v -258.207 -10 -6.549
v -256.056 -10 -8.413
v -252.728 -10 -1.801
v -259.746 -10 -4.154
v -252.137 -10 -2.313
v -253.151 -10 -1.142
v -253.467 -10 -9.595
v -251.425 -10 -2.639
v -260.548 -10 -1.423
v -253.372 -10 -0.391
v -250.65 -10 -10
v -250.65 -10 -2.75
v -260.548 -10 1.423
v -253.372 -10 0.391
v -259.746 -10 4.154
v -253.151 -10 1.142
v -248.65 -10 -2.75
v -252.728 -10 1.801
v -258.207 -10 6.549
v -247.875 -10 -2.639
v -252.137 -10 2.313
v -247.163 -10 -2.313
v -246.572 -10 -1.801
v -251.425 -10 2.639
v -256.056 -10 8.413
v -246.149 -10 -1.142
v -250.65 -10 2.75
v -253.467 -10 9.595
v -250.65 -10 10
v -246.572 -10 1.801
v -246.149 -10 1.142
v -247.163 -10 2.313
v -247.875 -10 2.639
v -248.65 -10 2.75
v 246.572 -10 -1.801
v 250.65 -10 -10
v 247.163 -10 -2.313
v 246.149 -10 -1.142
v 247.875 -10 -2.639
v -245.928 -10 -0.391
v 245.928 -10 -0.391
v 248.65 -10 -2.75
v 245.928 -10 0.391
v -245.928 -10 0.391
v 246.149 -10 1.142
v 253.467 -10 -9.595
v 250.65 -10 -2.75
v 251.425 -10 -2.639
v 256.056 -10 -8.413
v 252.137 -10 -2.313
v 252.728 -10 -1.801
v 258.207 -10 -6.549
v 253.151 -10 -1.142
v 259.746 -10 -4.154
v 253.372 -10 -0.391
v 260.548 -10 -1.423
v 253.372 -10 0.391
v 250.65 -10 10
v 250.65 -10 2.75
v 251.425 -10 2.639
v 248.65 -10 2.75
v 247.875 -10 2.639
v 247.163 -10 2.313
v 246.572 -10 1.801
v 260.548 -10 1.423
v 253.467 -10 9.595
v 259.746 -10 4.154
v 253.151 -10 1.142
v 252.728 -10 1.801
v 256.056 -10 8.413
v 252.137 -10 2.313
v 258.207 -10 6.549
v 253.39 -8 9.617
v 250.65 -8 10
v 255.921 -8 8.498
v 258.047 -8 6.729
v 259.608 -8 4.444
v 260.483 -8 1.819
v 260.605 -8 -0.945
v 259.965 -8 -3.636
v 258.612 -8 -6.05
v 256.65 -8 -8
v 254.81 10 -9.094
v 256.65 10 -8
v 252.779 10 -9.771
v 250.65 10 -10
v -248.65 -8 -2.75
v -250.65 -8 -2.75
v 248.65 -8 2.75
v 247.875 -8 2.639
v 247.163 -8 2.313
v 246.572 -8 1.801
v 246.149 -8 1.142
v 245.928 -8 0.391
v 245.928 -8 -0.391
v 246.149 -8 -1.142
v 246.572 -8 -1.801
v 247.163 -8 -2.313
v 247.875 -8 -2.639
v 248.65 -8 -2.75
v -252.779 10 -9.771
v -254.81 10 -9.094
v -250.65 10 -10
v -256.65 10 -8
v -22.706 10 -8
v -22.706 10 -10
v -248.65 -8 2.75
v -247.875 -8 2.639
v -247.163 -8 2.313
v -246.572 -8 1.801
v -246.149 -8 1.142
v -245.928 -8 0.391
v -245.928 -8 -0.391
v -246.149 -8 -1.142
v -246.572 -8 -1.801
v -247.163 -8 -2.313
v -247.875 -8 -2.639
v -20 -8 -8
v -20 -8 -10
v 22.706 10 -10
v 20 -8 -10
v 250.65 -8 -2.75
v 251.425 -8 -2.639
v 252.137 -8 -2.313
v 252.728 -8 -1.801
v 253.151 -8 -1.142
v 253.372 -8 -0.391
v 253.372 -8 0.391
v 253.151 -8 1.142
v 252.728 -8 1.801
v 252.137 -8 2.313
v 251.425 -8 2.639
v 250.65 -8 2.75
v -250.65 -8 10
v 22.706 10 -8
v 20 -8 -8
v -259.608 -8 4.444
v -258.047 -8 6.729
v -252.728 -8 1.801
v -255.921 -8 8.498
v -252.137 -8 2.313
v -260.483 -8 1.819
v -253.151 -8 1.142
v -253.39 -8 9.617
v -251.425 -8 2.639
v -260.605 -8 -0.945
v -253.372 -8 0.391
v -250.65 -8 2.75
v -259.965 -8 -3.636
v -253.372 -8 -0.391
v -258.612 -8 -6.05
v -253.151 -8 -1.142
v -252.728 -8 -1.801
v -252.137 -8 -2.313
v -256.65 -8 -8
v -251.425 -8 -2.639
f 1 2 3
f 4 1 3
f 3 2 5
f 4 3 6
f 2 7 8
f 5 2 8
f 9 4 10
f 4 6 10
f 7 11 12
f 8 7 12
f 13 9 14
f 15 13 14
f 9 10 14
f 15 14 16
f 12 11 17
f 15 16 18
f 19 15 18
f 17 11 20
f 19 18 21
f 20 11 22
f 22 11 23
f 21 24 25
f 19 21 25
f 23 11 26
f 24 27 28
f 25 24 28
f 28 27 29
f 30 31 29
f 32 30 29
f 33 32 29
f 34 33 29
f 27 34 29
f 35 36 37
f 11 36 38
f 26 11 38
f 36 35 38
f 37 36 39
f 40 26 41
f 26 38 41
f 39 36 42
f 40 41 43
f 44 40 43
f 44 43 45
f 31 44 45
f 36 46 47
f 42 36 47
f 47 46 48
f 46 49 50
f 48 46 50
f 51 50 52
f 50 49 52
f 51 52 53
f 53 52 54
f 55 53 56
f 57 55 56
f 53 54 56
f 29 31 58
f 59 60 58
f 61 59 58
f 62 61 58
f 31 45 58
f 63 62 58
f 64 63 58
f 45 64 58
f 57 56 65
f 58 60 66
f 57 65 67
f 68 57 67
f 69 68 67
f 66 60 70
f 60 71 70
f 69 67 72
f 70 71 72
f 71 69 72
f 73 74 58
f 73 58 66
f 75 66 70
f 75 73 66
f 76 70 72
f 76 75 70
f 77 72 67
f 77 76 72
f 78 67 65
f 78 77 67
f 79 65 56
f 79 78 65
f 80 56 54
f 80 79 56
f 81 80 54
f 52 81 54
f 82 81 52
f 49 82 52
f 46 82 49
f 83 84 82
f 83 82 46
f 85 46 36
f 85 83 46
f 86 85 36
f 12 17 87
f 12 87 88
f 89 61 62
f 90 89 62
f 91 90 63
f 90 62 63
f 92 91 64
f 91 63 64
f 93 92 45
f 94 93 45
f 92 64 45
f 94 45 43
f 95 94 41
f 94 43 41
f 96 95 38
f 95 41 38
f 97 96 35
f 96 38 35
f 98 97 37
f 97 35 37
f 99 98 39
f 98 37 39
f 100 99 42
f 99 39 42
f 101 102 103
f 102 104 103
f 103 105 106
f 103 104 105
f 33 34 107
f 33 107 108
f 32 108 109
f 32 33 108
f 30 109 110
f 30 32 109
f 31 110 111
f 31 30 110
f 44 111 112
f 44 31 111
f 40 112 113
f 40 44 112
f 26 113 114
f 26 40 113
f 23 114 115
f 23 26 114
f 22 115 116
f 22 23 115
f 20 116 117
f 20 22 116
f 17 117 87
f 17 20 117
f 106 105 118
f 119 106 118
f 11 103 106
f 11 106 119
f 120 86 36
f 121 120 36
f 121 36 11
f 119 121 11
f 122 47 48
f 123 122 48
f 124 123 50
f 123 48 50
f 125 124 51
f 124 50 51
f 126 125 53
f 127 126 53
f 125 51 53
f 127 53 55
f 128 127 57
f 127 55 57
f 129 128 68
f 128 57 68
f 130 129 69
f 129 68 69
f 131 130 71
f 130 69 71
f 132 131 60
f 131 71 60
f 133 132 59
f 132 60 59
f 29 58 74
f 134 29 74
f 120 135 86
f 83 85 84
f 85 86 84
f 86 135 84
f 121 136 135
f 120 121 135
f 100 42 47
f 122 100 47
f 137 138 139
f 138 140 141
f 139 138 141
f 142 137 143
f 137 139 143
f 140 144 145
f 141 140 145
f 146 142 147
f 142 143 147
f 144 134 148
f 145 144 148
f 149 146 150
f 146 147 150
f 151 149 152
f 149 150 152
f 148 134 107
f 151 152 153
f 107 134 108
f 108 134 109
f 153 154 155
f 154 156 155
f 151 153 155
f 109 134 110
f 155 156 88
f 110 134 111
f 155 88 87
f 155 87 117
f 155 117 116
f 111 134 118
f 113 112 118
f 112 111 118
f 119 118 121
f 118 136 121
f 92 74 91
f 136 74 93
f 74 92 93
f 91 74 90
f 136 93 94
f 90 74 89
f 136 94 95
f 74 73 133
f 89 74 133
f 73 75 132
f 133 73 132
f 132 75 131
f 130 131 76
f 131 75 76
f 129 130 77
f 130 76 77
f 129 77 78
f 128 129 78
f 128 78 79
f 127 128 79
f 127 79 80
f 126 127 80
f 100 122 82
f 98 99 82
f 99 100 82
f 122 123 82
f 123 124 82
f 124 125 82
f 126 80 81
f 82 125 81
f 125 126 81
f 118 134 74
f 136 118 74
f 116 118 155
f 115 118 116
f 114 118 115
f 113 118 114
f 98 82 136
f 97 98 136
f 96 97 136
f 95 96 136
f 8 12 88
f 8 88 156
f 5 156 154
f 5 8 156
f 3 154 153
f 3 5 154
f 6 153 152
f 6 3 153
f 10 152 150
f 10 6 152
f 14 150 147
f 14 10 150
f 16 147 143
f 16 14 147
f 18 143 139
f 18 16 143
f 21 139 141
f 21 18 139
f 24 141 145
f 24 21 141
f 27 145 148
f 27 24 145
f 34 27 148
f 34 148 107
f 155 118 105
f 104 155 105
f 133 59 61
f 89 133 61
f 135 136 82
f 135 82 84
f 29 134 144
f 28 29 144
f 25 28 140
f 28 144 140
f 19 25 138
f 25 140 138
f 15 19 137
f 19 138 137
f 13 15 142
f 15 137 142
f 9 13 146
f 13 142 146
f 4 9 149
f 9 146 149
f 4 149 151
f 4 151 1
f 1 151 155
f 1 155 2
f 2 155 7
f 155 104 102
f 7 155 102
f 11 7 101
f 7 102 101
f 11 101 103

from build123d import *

# Parameters (mm, degrees)
BOSS_EXTRUDE1_DEPTH = 270
CUT_EXTRUDE1_DEPTH  = 271.370116692
CUT_EXTRUDE2_DEPTH  = 262.462086162


with BuildPart() as part:
    # Sketch1 → Boss-Extrude1 (new, symmetric)
    with BuildSketch(Plane(origin=(0, 0, 0), x_dir=(0, 0, -1), z_dir=(1, 0, 0))):
        Polygon((8, 10), (10, 10), (10, -10), (-10, -10), (-10, -8), (8, -8), align=None)
    extrude(amount=BOSS_EXTRUDE1_DEPTH, both=True)

    # Sketch2 → Cut-Extrude1 (cut, symmetric)
    with BuildSketch(Plane(origin=(0, 0, 0), x_dir=(1, 0, 0), z_dir=(0, 1, 0))):
        with BuildLine():
            Line((248.65, 2.75), (250.65, 2.75))
            ThreePointArc((250.65, 2.75), (253.4, 0), (250.65, -2.75))
            Line((250.65, -2.75), (248.65, -2.75))
            ThreePointArc((248.65, -2.75), (245.9, 0), (248.65, 2.75))
        make_face()
        with BuildLine():
            ThreePointArc((250.65, -10), (260.65, 0), (250.65, 10))
            Line((250.65, 10), (270, 10))
            Line((270, 10), (270, -10))
            Line((270, -10), (250.65, -10))
        make_face()
    cut_extrude1 = extrude(amount=CUT_EXTRUDE1_DEPTH, both=True, mode=Mode.SUBTRACT)

    # Mirror1: Cut-Extrude1 across plane
    add(cut_extrude1.mirror(Plane(origin=(0, 0, 0), x_dir=(0, 0, 1), z_dir=(1, 0, 0))), mode=Mode.SUBTRACT)

    # Sketch3 → Cut-Extrude2 (cut, through all)
    with BuildSketch(Plane.XY.offset(-8)):
        Polygon((-20, -8), (20, -8), (22.706021628, 10), (-22.706021628, 10), align=None)
    extrude(amount=-CUT_EXTRUDE2_DEPTH, mode=Mode.SUBTRACT)


solid = part.part
